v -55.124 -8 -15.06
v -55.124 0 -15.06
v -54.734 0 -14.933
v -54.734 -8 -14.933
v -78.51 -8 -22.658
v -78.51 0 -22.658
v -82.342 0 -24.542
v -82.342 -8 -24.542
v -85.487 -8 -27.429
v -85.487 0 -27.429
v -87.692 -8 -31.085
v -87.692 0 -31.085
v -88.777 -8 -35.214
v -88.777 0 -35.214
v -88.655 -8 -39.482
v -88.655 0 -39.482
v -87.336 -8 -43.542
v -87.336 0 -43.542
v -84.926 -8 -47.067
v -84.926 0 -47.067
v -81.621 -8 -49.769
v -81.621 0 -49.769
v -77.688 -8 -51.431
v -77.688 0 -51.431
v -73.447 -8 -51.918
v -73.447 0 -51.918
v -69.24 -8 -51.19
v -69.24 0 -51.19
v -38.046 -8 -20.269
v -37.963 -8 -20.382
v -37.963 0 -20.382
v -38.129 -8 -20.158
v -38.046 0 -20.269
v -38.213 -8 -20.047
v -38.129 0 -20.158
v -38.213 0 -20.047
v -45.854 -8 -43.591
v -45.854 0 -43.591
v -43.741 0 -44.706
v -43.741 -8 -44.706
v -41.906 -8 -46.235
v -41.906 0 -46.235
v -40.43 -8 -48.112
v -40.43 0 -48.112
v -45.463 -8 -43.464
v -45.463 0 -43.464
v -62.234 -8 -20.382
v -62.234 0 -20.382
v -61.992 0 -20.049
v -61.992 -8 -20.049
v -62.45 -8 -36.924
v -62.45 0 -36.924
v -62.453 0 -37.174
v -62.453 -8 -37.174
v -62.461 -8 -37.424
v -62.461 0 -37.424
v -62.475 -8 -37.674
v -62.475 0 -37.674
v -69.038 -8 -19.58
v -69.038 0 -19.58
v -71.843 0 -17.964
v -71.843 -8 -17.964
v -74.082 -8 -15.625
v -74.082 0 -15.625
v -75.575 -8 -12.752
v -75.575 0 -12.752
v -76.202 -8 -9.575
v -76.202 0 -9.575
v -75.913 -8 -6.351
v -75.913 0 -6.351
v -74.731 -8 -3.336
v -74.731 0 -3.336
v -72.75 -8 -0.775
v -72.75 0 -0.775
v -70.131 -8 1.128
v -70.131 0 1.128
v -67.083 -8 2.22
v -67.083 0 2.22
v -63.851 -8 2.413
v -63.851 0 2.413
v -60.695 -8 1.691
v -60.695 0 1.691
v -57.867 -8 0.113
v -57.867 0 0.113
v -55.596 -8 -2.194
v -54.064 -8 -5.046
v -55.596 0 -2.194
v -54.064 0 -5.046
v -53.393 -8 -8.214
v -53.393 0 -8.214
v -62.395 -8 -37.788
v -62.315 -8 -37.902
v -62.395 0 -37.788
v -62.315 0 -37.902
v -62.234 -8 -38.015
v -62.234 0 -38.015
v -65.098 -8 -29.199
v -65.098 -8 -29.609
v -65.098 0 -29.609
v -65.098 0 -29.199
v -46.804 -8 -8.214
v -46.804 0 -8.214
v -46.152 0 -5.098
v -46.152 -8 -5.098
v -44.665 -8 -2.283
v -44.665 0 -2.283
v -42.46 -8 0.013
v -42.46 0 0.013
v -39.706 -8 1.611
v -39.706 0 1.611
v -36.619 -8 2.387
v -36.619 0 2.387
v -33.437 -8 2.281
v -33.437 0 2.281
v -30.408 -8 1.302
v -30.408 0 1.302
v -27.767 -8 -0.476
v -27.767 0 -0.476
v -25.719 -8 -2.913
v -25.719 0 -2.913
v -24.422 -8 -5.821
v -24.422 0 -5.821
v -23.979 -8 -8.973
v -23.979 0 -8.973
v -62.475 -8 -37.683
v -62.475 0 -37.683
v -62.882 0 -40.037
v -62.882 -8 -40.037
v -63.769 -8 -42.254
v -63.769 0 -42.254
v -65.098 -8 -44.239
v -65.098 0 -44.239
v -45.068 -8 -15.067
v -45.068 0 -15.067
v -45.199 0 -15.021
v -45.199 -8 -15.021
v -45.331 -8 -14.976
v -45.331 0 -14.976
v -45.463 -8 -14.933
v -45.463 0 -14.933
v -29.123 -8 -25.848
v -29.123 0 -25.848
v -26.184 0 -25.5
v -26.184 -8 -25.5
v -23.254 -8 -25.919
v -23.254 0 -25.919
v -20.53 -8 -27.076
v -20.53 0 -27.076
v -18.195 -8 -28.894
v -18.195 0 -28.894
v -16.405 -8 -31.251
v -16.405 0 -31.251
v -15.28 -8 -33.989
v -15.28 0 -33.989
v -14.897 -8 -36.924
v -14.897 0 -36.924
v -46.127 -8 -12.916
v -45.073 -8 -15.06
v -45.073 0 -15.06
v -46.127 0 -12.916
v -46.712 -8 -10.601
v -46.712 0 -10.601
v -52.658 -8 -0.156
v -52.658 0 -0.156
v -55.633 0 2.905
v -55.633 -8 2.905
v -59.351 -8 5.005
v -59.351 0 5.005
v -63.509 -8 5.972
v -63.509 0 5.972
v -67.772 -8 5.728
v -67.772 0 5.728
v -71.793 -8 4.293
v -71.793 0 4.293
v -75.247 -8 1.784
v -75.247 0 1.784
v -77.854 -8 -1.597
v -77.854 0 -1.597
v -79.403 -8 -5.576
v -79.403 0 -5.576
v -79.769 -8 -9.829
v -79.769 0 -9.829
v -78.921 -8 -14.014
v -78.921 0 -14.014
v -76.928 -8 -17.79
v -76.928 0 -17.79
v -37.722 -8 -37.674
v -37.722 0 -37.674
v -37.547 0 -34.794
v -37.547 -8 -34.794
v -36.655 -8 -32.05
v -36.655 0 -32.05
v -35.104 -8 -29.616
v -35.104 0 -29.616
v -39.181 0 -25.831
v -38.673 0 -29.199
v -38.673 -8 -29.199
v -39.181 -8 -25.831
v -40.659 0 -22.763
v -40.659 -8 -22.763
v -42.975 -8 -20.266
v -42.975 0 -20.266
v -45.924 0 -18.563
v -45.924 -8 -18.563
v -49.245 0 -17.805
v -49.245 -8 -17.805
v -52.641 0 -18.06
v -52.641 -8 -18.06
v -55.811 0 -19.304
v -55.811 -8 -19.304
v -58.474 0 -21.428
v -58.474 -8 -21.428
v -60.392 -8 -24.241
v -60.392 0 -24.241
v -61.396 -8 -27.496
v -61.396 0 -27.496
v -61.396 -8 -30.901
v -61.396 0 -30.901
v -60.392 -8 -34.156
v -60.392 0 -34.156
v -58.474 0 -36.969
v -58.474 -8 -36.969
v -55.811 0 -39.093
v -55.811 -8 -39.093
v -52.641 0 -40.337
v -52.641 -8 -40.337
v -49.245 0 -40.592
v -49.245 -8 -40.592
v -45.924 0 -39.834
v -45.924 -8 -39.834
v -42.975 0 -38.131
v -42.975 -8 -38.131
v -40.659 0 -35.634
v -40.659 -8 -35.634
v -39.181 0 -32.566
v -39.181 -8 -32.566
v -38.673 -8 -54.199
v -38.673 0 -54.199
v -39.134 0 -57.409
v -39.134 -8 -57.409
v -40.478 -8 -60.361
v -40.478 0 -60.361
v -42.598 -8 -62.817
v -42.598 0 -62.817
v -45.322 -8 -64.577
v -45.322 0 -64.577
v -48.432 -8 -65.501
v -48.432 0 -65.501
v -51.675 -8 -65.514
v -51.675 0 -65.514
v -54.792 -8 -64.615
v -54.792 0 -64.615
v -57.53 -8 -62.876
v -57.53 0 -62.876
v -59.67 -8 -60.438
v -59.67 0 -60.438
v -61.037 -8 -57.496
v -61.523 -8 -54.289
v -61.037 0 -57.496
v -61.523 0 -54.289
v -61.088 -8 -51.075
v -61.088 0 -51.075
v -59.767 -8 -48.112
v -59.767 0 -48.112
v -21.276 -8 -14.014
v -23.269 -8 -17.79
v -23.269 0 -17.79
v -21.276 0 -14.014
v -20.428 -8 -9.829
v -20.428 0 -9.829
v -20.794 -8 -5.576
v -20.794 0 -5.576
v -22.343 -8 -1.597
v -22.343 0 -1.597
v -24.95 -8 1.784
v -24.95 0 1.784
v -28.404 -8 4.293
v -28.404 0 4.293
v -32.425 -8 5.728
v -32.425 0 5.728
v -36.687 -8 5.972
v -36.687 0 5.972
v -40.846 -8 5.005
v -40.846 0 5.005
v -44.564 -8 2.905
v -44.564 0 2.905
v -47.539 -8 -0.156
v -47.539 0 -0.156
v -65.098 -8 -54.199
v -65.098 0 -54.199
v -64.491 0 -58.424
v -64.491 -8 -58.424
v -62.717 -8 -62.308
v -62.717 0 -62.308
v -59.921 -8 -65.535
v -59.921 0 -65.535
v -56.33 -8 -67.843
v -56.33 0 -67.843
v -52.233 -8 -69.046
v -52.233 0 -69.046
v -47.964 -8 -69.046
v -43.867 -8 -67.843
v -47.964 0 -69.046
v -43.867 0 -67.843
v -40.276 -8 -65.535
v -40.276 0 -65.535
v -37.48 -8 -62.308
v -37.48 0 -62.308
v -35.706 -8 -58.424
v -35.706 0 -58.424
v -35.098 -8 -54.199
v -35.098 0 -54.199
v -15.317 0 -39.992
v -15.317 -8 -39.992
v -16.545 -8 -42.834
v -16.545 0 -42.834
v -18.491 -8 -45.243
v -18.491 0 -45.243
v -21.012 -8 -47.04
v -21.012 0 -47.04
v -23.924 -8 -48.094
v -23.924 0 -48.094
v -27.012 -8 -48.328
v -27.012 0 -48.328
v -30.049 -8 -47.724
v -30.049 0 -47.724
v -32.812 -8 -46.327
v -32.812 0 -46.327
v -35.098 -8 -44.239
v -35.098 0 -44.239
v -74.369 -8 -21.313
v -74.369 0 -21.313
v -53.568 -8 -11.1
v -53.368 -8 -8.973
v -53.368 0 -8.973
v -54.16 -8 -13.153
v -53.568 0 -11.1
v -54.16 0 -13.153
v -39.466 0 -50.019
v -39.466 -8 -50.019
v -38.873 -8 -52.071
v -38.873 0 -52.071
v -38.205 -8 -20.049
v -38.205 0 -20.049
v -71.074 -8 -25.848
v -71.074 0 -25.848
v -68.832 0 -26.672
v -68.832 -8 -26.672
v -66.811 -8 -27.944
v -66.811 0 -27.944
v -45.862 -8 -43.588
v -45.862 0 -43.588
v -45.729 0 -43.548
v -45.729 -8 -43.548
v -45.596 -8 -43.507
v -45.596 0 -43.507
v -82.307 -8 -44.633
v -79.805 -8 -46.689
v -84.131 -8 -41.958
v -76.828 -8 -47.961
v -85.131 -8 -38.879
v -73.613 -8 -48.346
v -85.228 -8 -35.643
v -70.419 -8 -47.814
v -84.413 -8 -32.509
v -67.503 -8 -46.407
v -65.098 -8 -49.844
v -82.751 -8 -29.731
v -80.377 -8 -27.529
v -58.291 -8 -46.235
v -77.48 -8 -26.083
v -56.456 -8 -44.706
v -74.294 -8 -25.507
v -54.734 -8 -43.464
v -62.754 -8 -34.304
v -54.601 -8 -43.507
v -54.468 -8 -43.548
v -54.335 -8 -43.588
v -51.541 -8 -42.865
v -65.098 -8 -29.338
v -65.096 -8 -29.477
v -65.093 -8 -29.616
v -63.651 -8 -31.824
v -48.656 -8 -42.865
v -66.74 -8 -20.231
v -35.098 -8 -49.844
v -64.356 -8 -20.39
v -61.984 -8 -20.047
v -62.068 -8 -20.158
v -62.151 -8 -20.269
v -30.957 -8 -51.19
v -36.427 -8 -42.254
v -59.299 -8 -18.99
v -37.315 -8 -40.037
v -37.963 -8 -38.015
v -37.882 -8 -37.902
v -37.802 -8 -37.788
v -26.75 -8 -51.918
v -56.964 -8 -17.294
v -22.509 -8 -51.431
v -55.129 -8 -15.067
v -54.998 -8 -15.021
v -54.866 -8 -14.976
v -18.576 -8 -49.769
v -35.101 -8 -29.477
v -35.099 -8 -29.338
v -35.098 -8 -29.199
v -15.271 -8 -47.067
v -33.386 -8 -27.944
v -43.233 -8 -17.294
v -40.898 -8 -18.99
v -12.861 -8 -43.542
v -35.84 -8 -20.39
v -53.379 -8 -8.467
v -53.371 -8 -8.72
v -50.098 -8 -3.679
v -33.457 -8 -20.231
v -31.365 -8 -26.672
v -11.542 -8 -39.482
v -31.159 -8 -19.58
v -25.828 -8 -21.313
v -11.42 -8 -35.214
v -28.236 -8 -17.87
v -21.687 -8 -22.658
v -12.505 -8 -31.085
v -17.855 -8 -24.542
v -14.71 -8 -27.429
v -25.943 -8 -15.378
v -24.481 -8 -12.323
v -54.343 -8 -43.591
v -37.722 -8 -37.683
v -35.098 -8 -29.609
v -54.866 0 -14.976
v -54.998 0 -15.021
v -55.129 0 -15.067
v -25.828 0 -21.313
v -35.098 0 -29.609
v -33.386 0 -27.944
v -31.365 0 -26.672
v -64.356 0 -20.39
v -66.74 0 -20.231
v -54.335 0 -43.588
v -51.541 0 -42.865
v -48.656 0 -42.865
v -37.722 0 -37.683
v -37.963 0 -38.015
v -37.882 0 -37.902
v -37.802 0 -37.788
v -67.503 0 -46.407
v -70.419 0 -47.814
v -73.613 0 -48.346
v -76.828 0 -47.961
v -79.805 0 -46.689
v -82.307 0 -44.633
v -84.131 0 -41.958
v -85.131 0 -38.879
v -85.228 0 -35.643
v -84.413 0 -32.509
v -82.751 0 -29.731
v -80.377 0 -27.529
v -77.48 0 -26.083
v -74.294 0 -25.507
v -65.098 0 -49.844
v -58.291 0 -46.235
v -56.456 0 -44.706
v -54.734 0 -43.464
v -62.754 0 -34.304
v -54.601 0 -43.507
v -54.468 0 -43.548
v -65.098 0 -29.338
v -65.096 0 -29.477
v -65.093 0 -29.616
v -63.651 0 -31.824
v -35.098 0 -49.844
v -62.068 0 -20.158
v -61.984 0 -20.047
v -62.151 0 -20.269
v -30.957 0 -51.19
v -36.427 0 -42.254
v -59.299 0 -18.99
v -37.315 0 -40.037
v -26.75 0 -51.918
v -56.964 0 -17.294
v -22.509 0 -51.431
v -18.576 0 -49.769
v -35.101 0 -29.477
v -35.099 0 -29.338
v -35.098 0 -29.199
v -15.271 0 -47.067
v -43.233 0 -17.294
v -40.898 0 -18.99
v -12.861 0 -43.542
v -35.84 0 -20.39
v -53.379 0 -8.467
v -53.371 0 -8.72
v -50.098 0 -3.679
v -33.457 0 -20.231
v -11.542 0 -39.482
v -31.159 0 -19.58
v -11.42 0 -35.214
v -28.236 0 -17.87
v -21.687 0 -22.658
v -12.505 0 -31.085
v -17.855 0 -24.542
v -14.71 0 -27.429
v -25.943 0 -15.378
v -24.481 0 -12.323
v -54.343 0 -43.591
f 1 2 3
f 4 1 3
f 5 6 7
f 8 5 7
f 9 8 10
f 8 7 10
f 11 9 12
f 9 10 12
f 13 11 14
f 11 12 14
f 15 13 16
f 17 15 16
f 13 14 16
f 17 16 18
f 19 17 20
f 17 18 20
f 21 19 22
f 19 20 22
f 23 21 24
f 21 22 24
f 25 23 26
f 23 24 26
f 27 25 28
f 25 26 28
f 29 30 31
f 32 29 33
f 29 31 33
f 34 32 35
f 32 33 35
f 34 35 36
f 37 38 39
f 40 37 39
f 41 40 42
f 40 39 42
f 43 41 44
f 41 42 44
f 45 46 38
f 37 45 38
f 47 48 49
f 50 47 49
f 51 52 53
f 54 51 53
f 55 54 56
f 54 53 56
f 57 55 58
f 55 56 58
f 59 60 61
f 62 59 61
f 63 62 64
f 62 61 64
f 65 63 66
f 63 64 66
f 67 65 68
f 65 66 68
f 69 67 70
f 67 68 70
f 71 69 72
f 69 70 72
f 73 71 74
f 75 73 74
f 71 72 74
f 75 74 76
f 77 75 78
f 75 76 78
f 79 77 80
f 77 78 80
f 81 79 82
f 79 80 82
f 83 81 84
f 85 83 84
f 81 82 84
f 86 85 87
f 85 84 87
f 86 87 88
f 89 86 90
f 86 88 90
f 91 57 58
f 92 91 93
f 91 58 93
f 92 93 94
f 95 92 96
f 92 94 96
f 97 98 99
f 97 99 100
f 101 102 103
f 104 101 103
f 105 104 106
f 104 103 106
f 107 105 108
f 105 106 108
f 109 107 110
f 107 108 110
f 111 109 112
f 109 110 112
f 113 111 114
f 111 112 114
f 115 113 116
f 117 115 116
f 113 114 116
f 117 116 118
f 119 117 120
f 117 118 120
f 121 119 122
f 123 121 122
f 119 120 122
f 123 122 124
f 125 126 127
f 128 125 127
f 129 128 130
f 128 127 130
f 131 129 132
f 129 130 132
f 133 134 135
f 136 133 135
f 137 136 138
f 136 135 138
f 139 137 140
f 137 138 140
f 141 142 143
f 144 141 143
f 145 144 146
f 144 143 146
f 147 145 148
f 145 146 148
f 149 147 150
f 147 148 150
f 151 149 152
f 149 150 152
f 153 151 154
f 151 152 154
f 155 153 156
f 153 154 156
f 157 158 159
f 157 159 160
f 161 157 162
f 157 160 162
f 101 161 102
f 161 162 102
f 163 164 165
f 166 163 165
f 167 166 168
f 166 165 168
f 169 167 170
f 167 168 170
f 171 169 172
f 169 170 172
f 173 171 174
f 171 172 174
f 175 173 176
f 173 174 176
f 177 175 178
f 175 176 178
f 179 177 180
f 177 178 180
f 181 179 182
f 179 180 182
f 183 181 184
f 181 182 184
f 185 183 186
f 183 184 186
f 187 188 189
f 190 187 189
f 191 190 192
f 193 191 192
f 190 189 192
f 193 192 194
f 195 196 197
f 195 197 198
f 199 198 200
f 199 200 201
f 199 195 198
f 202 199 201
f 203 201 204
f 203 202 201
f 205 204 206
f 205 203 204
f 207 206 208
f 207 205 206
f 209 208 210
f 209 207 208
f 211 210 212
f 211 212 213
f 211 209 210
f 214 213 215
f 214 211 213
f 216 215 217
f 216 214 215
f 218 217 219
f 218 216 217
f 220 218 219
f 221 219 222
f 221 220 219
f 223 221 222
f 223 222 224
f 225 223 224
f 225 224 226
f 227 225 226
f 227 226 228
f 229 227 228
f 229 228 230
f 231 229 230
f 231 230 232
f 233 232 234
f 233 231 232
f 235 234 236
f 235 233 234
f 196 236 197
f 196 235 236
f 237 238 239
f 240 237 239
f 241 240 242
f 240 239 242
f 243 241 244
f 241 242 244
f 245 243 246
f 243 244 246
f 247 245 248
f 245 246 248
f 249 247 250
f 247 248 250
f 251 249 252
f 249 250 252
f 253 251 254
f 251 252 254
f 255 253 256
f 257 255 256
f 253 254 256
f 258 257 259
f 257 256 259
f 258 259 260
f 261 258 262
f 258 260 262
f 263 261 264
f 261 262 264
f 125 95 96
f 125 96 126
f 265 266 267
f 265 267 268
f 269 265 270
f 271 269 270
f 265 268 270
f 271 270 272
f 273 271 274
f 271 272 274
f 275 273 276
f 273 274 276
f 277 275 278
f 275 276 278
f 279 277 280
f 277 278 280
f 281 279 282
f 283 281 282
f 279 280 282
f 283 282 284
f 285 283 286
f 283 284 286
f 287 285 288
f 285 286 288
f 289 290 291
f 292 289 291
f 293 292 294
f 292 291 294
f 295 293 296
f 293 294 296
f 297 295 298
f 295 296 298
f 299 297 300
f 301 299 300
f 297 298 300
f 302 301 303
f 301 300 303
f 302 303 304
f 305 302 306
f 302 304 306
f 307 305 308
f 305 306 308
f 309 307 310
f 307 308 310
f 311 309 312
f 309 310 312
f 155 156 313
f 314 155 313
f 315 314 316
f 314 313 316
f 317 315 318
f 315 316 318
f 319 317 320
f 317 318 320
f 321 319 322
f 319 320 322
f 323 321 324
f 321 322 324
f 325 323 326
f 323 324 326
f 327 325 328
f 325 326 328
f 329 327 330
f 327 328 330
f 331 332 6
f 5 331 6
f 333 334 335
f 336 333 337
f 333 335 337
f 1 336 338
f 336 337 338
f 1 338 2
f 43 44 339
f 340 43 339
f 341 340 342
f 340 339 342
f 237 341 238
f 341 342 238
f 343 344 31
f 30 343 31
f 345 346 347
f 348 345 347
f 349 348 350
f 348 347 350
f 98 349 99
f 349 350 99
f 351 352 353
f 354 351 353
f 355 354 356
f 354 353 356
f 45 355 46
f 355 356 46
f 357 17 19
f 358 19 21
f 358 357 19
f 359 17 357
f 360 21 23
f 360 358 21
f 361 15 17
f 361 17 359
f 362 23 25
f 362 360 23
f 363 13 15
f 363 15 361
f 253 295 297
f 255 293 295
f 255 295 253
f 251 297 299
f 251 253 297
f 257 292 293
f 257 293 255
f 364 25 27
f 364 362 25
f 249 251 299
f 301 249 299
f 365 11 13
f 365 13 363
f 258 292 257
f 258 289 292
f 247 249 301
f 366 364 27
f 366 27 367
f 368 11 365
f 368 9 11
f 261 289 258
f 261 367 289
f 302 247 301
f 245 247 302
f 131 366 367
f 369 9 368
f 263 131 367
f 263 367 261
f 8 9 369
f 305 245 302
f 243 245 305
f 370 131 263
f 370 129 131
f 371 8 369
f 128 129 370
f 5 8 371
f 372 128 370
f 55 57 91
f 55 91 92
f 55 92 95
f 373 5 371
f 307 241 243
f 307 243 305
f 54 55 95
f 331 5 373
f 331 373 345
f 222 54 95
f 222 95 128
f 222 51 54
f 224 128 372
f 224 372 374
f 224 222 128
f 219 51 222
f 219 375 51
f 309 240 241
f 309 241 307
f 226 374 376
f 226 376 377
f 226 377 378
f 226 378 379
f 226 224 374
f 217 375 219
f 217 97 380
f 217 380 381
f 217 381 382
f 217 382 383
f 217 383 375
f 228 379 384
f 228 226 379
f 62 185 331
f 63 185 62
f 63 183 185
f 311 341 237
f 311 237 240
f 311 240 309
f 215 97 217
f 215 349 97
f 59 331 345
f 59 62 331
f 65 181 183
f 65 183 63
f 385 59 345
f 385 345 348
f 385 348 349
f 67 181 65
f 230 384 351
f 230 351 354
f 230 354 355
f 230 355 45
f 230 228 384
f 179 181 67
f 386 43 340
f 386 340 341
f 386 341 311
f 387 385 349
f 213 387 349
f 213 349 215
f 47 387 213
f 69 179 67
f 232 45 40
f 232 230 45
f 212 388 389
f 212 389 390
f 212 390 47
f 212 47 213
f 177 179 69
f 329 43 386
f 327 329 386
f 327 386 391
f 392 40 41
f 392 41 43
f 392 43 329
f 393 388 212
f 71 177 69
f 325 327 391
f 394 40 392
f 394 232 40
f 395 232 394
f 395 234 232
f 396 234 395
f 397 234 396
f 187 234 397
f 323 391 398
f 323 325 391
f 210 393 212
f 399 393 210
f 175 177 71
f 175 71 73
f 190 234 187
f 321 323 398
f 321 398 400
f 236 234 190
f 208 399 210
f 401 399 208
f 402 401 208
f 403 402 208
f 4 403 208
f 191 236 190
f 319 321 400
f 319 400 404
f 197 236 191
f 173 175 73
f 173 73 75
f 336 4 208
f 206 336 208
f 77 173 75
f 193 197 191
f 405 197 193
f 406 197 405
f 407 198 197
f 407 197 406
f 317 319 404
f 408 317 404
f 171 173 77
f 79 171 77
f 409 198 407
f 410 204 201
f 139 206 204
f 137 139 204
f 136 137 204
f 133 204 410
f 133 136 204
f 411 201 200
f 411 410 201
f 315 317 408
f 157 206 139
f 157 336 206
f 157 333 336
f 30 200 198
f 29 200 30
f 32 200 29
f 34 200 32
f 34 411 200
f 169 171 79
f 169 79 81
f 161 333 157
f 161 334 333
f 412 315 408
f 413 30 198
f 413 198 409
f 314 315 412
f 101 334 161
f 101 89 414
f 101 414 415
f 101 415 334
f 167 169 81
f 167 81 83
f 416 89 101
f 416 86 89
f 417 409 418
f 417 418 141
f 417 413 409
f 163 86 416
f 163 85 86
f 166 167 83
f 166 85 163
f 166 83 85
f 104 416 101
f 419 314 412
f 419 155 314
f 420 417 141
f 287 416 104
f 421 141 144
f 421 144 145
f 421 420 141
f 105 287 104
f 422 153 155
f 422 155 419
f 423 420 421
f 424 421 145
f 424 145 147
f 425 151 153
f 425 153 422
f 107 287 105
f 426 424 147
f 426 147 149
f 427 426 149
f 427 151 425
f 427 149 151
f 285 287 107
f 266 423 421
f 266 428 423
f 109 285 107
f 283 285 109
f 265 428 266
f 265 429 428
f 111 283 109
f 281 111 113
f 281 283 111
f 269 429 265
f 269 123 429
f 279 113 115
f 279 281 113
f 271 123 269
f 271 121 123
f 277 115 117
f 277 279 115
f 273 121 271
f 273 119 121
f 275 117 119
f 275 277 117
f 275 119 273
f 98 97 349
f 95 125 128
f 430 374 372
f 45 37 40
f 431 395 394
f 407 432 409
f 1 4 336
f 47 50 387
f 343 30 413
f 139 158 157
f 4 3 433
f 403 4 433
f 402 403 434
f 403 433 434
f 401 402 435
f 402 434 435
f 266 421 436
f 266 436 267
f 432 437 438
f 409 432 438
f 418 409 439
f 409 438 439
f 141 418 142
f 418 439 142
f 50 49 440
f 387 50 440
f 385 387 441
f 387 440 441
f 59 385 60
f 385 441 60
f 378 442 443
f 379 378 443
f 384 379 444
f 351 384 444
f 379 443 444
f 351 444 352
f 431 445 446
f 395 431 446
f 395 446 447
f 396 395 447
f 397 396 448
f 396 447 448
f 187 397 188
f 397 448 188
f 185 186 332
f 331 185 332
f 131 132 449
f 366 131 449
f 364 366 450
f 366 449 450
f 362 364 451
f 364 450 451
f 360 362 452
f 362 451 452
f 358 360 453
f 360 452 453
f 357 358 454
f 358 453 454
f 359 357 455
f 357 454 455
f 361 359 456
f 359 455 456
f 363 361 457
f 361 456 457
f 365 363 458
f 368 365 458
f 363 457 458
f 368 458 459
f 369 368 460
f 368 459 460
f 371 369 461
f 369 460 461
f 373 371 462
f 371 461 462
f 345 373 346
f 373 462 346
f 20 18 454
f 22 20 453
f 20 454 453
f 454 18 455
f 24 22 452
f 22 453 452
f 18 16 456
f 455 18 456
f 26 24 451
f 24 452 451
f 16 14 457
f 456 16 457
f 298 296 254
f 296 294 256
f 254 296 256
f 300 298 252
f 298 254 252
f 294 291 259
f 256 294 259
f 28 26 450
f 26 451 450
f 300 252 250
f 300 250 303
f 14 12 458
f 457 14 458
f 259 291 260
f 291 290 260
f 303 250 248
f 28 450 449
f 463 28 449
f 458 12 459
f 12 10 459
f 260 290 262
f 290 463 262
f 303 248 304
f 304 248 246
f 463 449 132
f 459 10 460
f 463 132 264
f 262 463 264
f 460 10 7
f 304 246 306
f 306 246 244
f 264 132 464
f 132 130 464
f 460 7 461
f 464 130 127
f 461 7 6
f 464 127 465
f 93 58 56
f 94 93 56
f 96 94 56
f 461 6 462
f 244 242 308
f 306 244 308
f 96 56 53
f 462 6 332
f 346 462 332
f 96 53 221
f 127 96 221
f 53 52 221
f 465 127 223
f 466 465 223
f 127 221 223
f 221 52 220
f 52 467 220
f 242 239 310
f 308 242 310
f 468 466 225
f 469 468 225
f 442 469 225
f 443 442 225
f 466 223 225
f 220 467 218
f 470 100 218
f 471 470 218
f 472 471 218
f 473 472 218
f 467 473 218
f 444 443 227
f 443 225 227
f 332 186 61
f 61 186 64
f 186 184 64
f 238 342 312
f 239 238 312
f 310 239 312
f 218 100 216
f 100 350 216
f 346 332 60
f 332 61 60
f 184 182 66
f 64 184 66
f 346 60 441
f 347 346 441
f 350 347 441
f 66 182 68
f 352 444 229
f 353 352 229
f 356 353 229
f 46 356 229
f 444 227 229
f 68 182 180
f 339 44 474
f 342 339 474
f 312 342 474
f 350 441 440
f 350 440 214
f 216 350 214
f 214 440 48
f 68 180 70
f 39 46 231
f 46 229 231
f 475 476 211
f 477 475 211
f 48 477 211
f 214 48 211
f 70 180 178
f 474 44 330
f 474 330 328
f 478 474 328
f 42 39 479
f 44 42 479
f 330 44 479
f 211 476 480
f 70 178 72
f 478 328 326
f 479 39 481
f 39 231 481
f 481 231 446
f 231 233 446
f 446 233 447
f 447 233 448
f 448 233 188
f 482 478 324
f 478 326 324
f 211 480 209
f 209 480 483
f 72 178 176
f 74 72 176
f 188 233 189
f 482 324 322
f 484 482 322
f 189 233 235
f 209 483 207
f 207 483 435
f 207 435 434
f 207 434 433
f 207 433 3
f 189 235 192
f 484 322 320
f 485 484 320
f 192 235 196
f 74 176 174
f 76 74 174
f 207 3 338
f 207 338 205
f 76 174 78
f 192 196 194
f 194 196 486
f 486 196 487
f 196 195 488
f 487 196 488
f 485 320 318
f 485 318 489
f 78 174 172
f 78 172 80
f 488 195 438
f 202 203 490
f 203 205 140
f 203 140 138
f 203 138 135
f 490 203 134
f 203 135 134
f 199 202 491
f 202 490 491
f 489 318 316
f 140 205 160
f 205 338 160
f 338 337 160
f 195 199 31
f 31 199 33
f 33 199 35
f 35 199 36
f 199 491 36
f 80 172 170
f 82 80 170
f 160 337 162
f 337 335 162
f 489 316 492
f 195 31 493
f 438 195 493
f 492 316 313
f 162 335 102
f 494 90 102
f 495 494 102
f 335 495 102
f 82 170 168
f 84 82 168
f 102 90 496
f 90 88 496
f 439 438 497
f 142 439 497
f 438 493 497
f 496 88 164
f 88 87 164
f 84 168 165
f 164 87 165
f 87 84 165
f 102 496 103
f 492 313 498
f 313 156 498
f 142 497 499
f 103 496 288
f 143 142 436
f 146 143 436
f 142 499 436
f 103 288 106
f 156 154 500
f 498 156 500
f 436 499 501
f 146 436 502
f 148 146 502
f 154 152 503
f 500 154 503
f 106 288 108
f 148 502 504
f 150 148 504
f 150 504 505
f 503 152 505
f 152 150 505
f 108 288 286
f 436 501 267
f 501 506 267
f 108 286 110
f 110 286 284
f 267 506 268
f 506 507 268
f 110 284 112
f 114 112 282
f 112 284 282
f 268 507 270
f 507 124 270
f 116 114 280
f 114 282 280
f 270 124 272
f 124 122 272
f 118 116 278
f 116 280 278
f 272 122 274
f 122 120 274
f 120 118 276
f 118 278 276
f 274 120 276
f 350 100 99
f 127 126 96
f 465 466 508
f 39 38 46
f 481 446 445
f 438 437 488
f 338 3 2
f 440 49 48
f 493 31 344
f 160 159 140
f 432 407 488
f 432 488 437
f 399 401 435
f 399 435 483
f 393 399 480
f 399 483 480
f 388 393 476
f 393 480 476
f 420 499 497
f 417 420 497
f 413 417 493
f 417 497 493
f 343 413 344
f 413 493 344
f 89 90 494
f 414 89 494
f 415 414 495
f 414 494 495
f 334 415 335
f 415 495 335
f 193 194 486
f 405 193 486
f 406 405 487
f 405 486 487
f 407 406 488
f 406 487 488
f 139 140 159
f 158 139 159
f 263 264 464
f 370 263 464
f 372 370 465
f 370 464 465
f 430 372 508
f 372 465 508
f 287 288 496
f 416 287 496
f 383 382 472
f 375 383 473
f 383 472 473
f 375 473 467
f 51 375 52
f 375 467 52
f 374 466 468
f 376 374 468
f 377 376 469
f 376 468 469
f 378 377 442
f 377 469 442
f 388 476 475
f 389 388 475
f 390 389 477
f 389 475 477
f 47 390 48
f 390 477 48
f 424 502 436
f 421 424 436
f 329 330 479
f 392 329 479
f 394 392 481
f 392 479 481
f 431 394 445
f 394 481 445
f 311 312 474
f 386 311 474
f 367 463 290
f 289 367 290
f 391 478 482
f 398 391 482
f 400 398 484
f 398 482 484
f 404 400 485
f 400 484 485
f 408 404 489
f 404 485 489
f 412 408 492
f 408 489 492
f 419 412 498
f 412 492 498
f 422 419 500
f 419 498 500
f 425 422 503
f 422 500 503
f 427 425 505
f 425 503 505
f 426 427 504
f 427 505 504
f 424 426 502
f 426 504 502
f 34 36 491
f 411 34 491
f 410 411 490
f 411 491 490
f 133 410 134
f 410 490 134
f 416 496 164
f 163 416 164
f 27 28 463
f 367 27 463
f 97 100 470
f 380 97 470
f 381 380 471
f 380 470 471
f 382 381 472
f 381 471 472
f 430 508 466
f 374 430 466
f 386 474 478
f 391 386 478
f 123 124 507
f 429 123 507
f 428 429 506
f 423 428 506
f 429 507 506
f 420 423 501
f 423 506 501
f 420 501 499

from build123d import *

# Parameters (mm, degrees)
F0_R     = 11.425
F1_DEPTH = 8


with BuildPart() as f1:
    # F0 (on Front) → F1 (new body)
    with BuildSketch(Plane.XZ):
        with BuildLine():
            ThreePointArc((-40.4296863013, -48.1120131359), (-39.1212964763, -51.0311038498), (-38.6734638929, -54.1985034943))
            ThreePointArc((-38.6734638929, -54.1985034943), (-53.2658635374, -65.1756709109), (-59.7672414846, -48.1120131359))
            Line((-59.7672414846, -48.1120131359), (-65.0984638929, -49.8442323013))
            Line((-65.0984638929, -49.8442323013), (-65.0984638929, -54.1985034943))
            ThreePointArc((-65.0984638929, -54.1985034943), (-50.0984638929, -69.1985034943), (-35.0984638929, -54.1985034943))
            Line((-35.0984638929, -54.1985034943), (-35.0984638929, -49.8442323013))
            Line((-35.0984638929, -49.8442323013), (-40.4296863013, -48.1120131359))
        make_face()
        with BuildLine():
            ThreePointArc((-45.8538077773, -43.5912644821), (-42.7837389166, -45.4220905869), (-40.4296863013, -48.1120131359))
            Line((-40.4296863013, -48.1120131359), (-35.0984638929, -49.8442323013))
            Line((-35.0984638929, -49.8442323013), (-35.0984638929, -44.23865333))
            ThreePointArc((-35.0984638929, -44.23865333), (-36.9292899977, -41.1685844692), (-37.7218056429, -37.6830190937))
            Line((-37.7218056429, -37.6830190937), (-37.9632089773, -38.0152822786))
            ThreePointArc((-37.9632089773, -38.0152822786), (-41.2816851085, -41.3337584099), (-45.4632089773, -43.4643512387))
            Line((-45.4632089773, -43.4643512387), (-45.8538077773, -43.5912644821))
        make_face()
        with BuildLine():
            Line((-65.0984638929, -49.8442323013), (-59.7672414846, -48.1120131359))
            ThreePointArc((-59.7672414846, -48.1120131359), (-57.4131888693, -45.4220905869), (-54.3431200085, -43.5912644821))
            Line((-54.3431200085, -43.5912644821), (-54.7337188086, -43.4643512387))
            ThreePointArc((-54.7337188086, -43.4643512387), (-58.9152426773, -41.3337584099), (-62.2337188086, -38.0152822786))
            Line((-62.2337188086, -38.0152822786), (-62.4751221429, -37.6830190937))
            ThreePointArc((-62.4751221429, -37.6830190937), (-63.2676377882, -41.1685844692), (-65.0984638929, -44.23865333))
            Line((-65.0984638929, -44.23865333), (-65.0984638929, -49.8442323013))
        make_face()
        with BuildLine():
            Line((-35.0984638929, -44.23865333), (-35.0984638929, -49.8442323013))
            Line((-35.0984638929, -49.8442323013), (-30.9573059012, -51.1897760981))
            ThreePointArc((-30.9573059012, -51.1897760981), (-12.0562032411, -41.5591832693), (-21.6867960699, -22.6580806092))
            Line((-21.6867960699, -22.6580806092), (-25.8279540617, -21.3125368125))
            Line((-25.8279540617, -21.3125368125), (-29.1228307116, -25.8475454636))
            ThreePointArc((-29.1228307116, -25.8475454636), (-19.3030867945, -27.9092310939), (-14.8970509856, -36.9239283536))
            ThreePointArc((-14.8970509856, -36.9239283536), (-22.4323140065, -47.6663941429), (-35.0984638929, -44.23865333))
        make_face()
        with BuildLine():
            Line((-69.2396218847, -51.1897760981), (-65.0984638929, -49.8442323013))
            Line((-65.0984638929, -49.8442323013), (-65.0984638929, -44.23865333))
            ThreePointArc((-65.0984638929, -44.23865333), (-84.740697499, -40.4544475144), (-71.0740970743, -25.8475454636))
            Line((-71.0740970743, -25.8475454636), (-74.3689737242, -21.3125368125))
            Line((-74.3689737242, -21.3125368125), (-78.5101317159, -22.6580806092))
            ThreePointArc((-78.5101317159, -22.6580806092), (-88.1407245447, -41.5591832693), (-69.2396218847, -51.1897760981))
        make_face()
        with BuildLine():
            Line((-74.3689737242, -21.3125368125), (-71.0740970743, -25.8475454636))
            ThreePointArc((-71.0740970743, -25.8475454636), (-67.7883864419, -27.255150762), (-65.0984638929, -29.6092033773))
            Line((-65.0984638929, -29.6092033773), (-65.0984638929, -29.1985034943))
            ThreePointArc((-65.0984638929, -29.1985034943), (-64.3643116374, -24.5632485786), (-62.2337188086, -20.3817247099))
            Line((-62.2337188086, -20.3817247099), (-61.9923154742, -20.0494615249))
            ThreePointArc((-61.9923154742, -20.0494615249), (-65.5521859403, -20.3728332923), (-69.0377513159, -19.580317647))
            Line((-69.0377513159, -19.580317647), (-74.3689737242, -21.3125368125))
        make_face()
        with BuildLine():
            Line((-35.0984638929, -29.1985034943), (-35.0984638929, -29.6092033773))
            ThreePointArc((-35.0984638929, -29.6092033773), (-32.408541344, -27.255150762), (-29.1228307116, -25.8475454636))
            Line((-29.1228307116, -25.8475454636), (-25.8279540617, -21.3125368125))
            Line((-25.8279540617, -21.3125368125), (-31.15917647, -19.580317647))
            ThreePointArc((-31.15917647, -19.580317647), (-34.6447418456, -20.3728332923), (-38.2046123117, -20.0494615249))
            Line((-38.2046123117, -20.0494615249), (-37.9632089773, -20.3817247099))
            ThreePointArc((-37.9632089773, -20.3817247099), (-35.8326161485, -24.5632485786), (-35.0984638929, -29.1985034943))
        make_face()
        with BuildLine():
            Line((-31.15917647, -19.580317647), (-25.8279540617, -21.3125368125))
            Line((-25.8279540617, -21.3125368125), (-23.26857767, -17.7898574193))
            ThreePointArc((-23.26857767, -17.7898574193), (-26.5870538012, 3.1621762807), (-47.5390875012, -0.1562998505))
            Line((-47.5390875012, -0.1562998505), (-50.0984638929, -3.6789792437))
            Line((-50.0984638929, -3.6789792437), (-46.803587243, -8.2139878949))
            ThreePointArc((-46.803587243, -8.2139878949), (-35.0240773753, 2.4456082853), (-23.9788325856, -8.9730786349))
            ThreePointArc((-23.9788325856, -8.9730786349), (-25.9427063017, -15.3775859883), (-31.15917647, -19.580317647))
        make_face()
        with BuildLine():
            Line((-76.9283501159, -17.7898574193), (-74.3689737242, -21.3125368125))
            Line((-74.3689737242, -21.3125368125), (-69.0377513159, -19.580317647))
            ThreePointArc((-69.0377513159, -19.580317647), (-71.5085417077, 0.2699405258), (-53.3933405429, -8.2139878949))
            Line((-53.3933405429, -8.2139878949), (-50.0984638929, -3.6789792437))
            Line((-50.0984638929, -3.6789792437), (-52.6578402846, -0.1562998505))
            ThreePointArc((-52.6578402846, -0.1562998505), (-73.6098739846, 3.1621762807), (-76.9283501159, -17.7898574193))
        make_face()
        with BuildLine():
            Line((-50.0984638929, -3.6789792437), (-53.3933405429, -8.2139878949))
            ThreePointArc((-53.3933405429, -8.2139878949), (-53.3744082801, -8.5933234246), (-53.3680952002, -8.9730786349))
            ThreePointArc((-53.3680952002, -8.9730786349), (-53.8159277836, -12.1404782793), (-55.1243176086, -15.0595689933))
            Line((-55.1243176086, -15.0595689933), (-54.7337188086, -14.9326557498))
            ThreePointArc((-54.7337188086, -14.9326557498), (-50.0984638929, -14.1985034943), (-45.4632089773, -14.9326557498))
            Line((-45.4632089773, -14.9326557498), (-45.0726101773, -15.0595689933))
            ThreePointArc((-45.0726101773, -15.0595689933), (-46.4802154756, -11.773858361), (-46.803587243, -8.2139878949))
            Line((-46.803587243, -8.2139878949), (-50.0984638929, -3.6789792437))
        make_face()
        with BuildLine():
            ThreePointArc((-54.3346800554, -43.5878909943), (-50.0984638929, -42.7735034943), (-45.8622477305, -43.5878909943))
            ThreePointArc((-45.8622477305, -43.5878909943), (-45.6622982862, -43.5275102536), (-45.4632089773, -43.4643512387))
            ThreePointArc((-45.4632089773, -43.4643512387), (-41.2816851085, -41.3337584099), (-37.9632089773, -38.0152822786))
            ThreePointArc((-37.9632089773, -38.0152822786), (-37.8416192047, -37.845454303), (-37.7224059316, -37.6739497561))
            ThreePointArc((-37.7224059316, -37.6739497561), (-37.1878716842, -33.3934091929), (-35.1042803595, -29.6161877847))
            ThreePointArc((-35.1042803595, -29.6161877847), (-35.0999180801, -29.4073658878), (-35.0984638929, -29.1985034943))
            ThreePointArc((-35.0984638929, -29.1985034943), (-35.8326161485, -24.5632485786), (-37.9632089773, -20.3817247099))
            ThreePointArc((-37.9632089773, -20.3817247099), (-38.0871516741, -20.2136062338), (-38.2134232637, -20.0472298539))
            ThreePointArc((-38.2134232637, -20.0472298539), (-42.1192790931, -18.2160977956), (-45.0677649982, -15.0672590823))
            ThreePointArc((-45.0677649982, -15.0672590823), (-45.2650184055, -14.9985807931), (-45.4632089773, -14.9326557498))
            ThreePointArc((-45.4632089773, -14.9326557498), (-50.0984638929, -14.1985034943), (-54.7337188086, -14.9326557498))
            ThreePointArc((-54.7337188086, -14.9326557498), (-54.9319093804, -14.9985807931), (-55.1291627877, -15.0672590823))
            ThreePointArc((-55.1291627877, -15.0672590823), (-58.0776486928, -18.2160977956), (-61.9835045222, -20.0472298539))
            ThreePointArc((-61.9835045222, -20.0472298539), (-62.1097761118, -20.2136062338), (-62.2337188086, -20.3817247099))
            ThreePointArc((-62.2337188086, -20.3817247099), (-64.3643116374, -24.5632485786), (-65.0984638929, -29.1985034943))
            ThreePointArc((-65.0984638929, -29.1985034943), (-65.0970097058, -29.4073658878), (-65.0926474263, -29.6161877847))
            ThreePointArc((-65.0926474263, -29.6161877847), (-63.1308646168, -33.0384647775), (-62.4498768003, -36.9239283536))
            ThreePointArc((-62.4498768003, -36.9239283536), (-62.456039726, -37.299141454), (-62.4745218543, -37.6739497561))
            ThreePointArc((-62.4745218543, -37.6739497561), (-62.3553085811, -37.845454303), (-62.2337188086, -38.0152822786))
            ThreePointArc((-62.2337188086, -38.0152822786), (-58.9152426773, -41.3337584099), (-54.7337188086, -43.4643512387))
            ThreePointArc((-54.7337188086, -43.4643512387), (-54.5346294996, -43.5275102536), (-54.3346800554, -43.5878909943))
        make_face()
        with Locations((-50.0984638929, -29.1985034943)):
            Circle(F0_R, mode=Mode.SUBTRACT)
    extrude(amount=F1_DEPTH)


solid = f1.part
